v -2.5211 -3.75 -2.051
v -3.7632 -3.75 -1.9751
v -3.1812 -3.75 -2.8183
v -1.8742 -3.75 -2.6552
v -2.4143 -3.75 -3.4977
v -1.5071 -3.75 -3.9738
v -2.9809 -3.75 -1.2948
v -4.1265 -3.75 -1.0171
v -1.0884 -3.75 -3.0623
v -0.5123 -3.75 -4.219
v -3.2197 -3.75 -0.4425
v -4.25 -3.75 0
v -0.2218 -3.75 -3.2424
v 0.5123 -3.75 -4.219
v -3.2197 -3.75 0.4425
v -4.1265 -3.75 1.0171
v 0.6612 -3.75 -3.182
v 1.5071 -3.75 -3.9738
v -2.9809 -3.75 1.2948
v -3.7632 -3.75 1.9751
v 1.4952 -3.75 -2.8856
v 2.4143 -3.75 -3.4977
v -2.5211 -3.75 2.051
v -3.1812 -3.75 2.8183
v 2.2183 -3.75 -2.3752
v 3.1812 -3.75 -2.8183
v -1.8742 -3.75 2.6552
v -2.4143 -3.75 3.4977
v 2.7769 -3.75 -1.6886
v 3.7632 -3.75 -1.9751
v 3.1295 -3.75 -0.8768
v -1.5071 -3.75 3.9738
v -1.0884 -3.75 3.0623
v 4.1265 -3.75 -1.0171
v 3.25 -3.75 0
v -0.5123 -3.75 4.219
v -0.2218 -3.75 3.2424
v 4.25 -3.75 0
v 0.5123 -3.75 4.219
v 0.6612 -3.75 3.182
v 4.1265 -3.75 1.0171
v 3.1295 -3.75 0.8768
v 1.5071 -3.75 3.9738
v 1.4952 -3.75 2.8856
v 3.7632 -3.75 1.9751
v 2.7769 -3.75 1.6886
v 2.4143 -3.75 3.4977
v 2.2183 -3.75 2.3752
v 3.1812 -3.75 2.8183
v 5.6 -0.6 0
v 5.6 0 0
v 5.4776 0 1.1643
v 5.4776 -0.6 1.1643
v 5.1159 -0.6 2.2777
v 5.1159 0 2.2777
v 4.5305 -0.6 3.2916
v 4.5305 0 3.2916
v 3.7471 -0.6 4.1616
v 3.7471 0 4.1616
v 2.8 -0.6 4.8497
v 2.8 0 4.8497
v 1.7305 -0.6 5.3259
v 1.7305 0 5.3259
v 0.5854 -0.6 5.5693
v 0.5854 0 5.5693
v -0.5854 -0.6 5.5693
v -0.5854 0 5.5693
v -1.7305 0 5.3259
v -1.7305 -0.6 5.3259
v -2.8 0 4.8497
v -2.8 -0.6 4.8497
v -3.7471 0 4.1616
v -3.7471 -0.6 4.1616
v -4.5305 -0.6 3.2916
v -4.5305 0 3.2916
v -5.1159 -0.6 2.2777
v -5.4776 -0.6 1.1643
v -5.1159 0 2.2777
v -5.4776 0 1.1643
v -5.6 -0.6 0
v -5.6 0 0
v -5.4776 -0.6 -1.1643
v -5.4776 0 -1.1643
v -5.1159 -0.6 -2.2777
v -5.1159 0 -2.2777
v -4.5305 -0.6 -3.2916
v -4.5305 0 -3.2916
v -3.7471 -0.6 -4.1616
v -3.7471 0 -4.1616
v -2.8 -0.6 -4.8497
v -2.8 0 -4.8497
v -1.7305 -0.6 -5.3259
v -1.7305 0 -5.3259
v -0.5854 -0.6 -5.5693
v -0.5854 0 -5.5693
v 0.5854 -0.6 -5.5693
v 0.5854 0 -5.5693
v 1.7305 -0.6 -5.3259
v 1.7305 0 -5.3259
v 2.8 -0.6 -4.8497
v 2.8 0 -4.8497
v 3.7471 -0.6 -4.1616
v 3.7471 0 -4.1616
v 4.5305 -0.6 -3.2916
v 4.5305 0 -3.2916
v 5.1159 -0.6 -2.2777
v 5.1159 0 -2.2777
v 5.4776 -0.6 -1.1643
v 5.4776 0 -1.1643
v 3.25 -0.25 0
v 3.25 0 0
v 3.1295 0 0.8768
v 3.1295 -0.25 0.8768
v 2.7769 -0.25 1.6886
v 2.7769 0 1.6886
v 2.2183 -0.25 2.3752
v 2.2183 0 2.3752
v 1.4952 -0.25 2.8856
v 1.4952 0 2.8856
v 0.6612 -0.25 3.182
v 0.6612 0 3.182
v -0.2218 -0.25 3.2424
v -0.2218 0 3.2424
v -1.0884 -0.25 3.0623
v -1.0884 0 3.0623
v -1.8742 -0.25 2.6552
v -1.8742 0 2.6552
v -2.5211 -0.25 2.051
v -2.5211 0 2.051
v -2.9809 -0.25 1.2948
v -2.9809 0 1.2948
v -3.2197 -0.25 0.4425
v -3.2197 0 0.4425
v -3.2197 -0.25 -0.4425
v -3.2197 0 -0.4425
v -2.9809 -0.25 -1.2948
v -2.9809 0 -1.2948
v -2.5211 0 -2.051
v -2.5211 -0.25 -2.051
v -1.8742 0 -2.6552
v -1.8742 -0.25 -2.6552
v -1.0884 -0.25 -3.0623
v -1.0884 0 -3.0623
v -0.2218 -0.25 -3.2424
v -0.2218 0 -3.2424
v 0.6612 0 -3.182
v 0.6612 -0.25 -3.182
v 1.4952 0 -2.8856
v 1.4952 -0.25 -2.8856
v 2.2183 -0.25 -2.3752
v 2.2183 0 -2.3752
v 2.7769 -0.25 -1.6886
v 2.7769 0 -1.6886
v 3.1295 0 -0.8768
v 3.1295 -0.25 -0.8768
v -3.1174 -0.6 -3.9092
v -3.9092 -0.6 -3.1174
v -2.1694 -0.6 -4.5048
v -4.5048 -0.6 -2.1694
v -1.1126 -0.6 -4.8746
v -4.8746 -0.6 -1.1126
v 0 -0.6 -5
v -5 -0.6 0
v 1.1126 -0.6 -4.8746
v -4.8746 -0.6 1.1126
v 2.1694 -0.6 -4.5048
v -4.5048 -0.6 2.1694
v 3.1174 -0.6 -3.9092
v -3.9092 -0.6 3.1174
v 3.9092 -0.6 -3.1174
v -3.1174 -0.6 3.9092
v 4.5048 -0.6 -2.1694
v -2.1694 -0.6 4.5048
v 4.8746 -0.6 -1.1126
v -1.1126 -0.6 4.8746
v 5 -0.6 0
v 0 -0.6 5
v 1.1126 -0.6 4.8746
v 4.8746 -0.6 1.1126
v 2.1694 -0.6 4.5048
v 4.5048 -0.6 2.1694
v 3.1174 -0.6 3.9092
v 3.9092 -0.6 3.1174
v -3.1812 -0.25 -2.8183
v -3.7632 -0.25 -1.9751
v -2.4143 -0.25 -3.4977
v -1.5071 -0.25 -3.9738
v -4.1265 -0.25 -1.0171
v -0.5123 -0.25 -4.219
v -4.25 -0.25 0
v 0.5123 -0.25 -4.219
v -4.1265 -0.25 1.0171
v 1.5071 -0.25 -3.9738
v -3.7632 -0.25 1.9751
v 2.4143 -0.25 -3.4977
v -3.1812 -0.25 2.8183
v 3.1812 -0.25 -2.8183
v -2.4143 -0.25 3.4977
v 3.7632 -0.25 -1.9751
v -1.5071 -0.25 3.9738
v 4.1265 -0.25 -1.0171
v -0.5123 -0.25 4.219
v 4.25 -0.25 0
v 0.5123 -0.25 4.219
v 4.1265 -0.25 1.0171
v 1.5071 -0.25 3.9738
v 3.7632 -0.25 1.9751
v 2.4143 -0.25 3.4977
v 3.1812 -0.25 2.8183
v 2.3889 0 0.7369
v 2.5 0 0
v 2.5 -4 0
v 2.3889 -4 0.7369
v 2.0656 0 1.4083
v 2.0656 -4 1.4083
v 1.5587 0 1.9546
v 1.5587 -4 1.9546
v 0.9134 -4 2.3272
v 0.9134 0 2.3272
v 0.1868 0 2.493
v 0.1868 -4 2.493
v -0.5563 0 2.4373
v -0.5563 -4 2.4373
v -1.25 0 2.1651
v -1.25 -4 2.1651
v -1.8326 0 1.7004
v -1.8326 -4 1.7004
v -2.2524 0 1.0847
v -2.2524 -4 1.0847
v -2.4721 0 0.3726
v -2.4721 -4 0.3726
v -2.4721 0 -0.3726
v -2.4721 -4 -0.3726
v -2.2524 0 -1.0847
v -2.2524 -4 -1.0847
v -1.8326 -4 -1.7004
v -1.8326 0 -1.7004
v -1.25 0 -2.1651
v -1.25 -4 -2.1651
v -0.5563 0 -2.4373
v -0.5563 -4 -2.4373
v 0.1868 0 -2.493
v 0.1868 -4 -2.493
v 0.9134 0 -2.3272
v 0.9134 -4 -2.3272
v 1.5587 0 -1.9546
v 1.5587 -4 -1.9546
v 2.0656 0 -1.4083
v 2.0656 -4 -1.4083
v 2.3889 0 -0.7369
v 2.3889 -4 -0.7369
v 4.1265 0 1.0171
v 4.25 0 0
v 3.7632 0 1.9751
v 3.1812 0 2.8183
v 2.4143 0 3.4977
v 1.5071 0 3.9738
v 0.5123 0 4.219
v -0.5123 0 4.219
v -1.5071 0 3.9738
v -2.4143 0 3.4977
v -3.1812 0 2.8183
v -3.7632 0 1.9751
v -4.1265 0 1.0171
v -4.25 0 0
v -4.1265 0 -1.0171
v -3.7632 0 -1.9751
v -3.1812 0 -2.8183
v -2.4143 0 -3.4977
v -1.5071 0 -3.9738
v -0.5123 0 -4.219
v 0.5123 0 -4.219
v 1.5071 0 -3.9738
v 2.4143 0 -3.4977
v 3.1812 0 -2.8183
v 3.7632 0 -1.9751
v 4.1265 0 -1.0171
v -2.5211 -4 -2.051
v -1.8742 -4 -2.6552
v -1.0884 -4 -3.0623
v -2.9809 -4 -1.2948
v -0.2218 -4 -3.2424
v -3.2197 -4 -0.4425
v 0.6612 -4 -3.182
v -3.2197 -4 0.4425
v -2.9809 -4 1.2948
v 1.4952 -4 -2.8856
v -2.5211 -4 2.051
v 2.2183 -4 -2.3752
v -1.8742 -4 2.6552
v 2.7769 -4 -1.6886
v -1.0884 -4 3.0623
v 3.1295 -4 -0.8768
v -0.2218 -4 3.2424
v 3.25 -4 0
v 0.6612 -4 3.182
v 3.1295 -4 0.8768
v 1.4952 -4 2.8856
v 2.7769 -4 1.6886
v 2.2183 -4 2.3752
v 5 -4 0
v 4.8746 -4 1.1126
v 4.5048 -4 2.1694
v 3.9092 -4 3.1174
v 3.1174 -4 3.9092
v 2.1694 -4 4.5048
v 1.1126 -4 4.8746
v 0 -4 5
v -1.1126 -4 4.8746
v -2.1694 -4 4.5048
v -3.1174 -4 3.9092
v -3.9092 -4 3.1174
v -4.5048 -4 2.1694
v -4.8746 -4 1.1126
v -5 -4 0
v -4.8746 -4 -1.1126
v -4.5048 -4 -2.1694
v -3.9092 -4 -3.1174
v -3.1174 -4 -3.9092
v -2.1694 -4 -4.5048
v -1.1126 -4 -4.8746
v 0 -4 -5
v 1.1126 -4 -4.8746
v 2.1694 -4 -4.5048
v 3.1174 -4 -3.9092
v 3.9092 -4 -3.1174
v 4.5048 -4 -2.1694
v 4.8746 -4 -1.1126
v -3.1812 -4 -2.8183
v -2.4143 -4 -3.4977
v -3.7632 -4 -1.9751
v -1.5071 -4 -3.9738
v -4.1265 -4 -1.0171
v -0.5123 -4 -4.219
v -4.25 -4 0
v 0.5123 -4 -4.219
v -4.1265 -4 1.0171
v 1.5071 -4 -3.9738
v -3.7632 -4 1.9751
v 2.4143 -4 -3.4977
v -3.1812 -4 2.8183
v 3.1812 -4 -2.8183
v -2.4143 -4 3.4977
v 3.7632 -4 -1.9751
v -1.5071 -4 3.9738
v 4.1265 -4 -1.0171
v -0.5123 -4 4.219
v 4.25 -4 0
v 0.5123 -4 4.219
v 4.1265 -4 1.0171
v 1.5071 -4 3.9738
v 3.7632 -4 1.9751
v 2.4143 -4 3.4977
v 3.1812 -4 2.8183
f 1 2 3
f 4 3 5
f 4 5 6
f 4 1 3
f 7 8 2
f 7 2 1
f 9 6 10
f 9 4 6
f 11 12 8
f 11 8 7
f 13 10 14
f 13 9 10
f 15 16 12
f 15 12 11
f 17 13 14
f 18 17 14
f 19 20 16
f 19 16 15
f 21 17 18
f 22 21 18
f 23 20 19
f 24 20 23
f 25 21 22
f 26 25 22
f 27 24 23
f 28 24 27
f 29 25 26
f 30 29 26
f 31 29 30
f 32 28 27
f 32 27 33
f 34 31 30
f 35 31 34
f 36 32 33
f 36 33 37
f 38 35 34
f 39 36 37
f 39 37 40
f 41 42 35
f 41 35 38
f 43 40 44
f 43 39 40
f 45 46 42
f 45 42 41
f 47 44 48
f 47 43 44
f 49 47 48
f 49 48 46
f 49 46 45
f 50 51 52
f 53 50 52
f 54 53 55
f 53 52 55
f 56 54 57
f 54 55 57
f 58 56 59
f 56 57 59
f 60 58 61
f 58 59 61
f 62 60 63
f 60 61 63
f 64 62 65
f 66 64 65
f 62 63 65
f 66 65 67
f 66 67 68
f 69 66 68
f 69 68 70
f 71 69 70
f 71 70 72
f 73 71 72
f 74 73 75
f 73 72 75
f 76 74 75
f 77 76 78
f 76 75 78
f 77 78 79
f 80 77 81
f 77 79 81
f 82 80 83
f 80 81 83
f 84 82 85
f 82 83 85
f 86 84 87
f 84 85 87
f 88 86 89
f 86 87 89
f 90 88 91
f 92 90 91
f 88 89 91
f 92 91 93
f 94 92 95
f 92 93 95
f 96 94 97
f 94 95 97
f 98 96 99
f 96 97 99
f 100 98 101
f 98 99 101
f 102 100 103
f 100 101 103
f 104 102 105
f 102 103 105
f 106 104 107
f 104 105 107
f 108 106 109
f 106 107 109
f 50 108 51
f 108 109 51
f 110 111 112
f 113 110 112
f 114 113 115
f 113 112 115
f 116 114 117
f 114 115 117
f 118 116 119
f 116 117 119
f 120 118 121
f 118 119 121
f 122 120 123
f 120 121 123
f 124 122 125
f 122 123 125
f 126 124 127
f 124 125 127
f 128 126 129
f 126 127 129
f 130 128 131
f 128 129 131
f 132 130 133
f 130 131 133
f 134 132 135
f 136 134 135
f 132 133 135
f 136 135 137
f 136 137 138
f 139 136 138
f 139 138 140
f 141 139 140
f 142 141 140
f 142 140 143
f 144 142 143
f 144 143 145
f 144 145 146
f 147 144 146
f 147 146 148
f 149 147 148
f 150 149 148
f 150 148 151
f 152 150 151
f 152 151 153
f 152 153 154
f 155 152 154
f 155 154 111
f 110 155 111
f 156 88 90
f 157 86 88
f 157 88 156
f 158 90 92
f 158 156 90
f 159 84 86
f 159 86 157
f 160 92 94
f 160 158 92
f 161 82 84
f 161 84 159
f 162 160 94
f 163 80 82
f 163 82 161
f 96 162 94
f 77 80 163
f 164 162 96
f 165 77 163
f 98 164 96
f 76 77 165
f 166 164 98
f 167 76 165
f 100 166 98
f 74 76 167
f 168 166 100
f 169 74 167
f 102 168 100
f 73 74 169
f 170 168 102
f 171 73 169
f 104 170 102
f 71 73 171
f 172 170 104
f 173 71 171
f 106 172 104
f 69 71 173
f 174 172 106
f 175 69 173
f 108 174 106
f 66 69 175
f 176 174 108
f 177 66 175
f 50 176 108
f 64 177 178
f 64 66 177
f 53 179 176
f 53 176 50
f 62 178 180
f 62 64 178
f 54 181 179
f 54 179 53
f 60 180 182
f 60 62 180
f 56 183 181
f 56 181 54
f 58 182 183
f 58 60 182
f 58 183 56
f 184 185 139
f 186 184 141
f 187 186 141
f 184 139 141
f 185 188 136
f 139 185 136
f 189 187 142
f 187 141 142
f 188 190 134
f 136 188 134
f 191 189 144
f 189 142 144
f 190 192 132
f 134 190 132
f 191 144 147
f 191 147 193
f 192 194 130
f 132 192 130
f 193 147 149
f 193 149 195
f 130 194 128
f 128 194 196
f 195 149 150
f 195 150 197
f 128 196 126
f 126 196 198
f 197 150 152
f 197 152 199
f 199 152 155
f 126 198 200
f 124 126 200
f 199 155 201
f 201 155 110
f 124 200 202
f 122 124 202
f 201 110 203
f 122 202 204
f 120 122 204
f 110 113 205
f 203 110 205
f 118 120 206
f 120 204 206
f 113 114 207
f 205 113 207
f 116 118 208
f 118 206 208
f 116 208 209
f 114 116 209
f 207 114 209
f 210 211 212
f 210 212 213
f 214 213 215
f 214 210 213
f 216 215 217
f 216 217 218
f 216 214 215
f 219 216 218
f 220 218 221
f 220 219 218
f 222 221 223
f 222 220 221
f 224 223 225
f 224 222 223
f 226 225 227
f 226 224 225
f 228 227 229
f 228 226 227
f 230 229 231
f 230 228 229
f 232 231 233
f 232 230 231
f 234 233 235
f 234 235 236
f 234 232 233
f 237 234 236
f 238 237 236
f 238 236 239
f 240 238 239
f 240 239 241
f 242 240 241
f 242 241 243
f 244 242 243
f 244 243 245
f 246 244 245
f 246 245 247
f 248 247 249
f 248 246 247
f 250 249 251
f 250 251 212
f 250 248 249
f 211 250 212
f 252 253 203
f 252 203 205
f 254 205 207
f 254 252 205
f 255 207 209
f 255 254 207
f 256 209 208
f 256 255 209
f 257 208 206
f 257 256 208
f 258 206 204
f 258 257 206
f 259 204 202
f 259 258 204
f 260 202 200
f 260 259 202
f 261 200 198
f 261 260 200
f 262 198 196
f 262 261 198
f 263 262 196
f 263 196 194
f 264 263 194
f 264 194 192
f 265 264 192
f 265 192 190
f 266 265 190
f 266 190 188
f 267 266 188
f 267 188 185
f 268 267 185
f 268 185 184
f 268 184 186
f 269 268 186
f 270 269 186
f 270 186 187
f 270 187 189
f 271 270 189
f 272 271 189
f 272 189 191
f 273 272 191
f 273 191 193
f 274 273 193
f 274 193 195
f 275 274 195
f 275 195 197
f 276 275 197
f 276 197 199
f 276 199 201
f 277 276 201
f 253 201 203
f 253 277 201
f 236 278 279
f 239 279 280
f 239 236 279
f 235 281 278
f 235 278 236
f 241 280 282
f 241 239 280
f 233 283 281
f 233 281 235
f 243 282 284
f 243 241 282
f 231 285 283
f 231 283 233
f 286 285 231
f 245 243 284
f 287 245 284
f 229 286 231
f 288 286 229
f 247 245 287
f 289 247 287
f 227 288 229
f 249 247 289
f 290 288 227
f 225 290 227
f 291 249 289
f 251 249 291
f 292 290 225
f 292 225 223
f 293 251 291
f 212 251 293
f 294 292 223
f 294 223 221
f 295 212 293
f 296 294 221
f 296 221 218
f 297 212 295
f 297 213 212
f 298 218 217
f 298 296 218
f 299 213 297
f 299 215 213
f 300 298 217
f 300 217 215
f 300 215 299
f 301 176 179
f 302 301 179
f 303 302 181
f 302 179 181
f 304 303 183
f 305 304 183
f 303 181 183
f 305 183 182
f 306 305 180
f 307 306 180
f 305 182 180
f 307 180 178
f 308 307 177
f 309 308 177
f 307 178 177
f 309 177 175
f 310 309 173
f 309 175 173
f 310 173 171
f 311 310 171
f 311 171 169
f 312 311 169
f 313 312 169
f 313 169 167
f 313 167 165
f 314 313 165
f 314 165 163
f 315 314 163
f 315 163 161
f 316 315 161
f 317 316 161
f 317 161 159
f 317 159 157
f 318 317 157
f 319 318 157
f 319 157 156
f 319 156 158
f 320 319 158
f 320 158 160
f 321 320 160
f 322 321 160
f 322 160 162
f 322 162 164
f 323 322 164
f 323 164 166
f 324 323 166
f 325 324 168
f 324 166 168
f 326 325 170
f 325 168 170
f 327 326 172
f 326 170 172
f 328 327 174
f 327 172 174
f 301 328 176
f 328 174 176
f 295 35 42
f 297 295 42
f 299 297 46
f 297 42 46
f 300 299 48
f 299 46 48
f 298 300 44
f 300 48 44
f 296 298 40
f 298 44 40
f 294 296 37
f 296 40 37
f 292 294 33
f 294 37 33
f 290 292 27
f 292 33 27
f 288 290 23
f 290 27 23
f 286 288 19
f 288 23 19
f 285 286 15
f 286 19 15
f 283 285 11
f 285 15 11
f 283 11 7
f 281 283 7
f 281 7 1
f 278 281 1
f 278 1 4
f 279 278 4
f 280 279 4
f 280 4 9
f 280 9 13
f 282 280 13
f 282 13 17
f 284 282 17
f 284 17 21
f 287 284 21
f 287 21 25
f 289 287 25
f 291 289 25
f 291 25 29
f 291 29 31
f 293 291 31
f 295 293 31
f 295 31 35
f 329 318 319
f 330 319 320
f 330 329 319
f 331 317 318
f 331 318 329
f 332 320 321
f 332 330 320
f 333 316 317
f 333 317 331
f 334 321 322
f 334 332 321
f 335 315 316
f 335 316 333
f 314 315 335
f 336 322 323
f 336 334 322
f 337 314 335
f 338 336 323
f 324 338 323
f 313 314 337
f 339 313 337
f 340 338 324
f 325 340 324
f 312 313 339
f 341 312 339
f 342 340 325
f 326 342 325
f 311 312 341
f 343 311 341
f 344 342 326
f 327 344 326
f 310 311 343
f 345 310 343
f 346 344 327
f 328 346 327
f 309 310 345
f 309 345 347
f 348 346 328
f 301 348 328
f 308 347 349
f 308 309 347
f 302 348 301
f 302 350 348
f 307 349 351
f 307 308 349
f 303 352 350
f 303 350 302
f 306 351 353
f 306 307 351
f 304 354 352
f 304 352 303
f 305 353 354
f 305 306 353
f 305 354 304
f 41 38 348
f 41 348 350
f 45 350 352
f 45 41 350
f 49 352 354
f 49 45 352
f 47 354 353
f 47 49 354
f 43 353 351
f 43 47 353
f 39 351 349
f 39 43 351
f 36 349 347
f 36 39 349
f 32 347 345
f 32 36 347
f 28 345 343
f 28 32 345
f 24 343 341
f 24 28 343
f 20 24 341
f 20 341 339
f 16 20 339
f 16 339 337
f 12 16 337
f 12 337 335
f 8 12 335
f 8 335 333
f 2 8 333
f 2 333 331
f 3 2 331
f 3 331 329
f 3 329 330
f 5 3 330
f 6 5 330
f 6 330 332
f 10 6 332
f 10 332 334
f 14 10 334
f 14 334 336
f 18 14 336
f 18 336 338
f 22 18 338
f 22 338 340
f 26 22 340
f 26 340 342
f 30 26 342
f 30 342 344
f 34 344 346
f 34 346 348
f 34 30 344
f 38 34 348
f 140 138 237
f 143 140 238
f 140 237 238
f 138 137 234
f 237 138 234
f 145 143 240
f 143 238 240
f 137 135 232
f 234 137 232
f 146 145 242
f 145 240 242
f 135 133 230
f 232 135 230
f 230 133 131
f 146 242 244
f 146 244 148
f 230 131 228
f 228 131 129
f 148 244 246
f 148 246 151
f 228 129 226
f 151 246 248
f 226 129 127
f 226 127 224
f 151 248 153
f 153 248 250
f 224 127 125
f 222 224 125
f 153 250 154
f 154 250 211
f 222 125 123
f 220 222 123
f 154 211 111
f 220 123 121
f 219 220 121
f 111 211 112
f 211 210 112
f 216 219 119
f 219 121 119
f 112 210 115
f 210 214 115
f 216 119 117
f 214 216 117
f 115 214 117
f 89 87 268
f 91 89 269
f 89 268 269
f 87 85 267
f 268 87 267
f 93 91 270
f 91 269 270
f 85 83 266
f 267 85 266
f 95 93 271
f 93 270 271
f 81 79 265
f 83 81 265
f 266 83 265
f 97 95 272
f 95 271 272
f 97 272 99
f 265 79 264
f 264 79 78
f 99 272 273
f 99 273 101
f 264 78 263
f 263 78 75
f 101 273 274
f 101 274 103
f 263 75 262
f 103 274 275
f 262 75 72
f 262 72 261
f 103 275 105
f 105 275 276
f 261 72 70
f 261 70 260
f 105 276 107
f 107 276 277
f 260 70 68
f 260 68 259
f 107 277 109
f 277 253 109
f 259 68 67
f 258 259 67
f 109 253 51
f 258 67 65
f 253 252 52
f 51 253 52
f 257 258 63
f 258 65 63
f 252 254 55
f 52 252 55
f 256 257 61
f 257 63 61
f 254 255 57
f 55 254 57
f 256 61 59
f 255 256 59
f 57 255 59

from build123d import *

# Parameters (mm, degrees)
F2_R      = 5.6
F2_R_2    = 5
F3_DEPTH  = 0.6
F4_R      = 5
F4_R_2    = 4.25
F5_DEPTH  = 4
F6_R      = 3.25
F6_R_2    = 2.5
F7_DEPTH  = 4
F9_R      = 4.25
F9_R_2    = 3.25
F10_DEPTH = 1.75


with BuildPart() as f3:
    # F2 (on Front) → F3 (new body)
    with BuildSketch(Plane.XZ):
        Circle(F2_R)
        Circle(F2_R_2, mode=Mode.SUBTRACT)
    extrude(amount=F3_DEPTH)

    # F4 (on Front) → F5 (join)
    with BuildSketch(Plane.XZ):
        Circle(F4_R)
        Circle(F4_R_2, mode=Mode.SUBTRACT)
    extrude(amount=F5_DEPTH)



with BuildPart() as f7:
    # F6 (on Front) → F7 (new body)
    with BuildSketch(Plane.XZ):
        Circle(F6_R)
        Circle(F6_R_2, mode=Mode.SUBTRACT)
    extrude(amount=F7_DEPTH)


with BuildPart() as f3_1:
    add(f3.part)

    add(f7.part)  # F10 merges F7
    # F9 (on offset) → F10 (join, symmetric)
    with BuildSketch(Plane.XZ.offset(2)):
        Circle(F9_R)
        Circle(F9_R_2, mode=Mode.SUBTRACT)
    extrude(amount=F10_DEPTH, both=True)


solid = f3_1.part
